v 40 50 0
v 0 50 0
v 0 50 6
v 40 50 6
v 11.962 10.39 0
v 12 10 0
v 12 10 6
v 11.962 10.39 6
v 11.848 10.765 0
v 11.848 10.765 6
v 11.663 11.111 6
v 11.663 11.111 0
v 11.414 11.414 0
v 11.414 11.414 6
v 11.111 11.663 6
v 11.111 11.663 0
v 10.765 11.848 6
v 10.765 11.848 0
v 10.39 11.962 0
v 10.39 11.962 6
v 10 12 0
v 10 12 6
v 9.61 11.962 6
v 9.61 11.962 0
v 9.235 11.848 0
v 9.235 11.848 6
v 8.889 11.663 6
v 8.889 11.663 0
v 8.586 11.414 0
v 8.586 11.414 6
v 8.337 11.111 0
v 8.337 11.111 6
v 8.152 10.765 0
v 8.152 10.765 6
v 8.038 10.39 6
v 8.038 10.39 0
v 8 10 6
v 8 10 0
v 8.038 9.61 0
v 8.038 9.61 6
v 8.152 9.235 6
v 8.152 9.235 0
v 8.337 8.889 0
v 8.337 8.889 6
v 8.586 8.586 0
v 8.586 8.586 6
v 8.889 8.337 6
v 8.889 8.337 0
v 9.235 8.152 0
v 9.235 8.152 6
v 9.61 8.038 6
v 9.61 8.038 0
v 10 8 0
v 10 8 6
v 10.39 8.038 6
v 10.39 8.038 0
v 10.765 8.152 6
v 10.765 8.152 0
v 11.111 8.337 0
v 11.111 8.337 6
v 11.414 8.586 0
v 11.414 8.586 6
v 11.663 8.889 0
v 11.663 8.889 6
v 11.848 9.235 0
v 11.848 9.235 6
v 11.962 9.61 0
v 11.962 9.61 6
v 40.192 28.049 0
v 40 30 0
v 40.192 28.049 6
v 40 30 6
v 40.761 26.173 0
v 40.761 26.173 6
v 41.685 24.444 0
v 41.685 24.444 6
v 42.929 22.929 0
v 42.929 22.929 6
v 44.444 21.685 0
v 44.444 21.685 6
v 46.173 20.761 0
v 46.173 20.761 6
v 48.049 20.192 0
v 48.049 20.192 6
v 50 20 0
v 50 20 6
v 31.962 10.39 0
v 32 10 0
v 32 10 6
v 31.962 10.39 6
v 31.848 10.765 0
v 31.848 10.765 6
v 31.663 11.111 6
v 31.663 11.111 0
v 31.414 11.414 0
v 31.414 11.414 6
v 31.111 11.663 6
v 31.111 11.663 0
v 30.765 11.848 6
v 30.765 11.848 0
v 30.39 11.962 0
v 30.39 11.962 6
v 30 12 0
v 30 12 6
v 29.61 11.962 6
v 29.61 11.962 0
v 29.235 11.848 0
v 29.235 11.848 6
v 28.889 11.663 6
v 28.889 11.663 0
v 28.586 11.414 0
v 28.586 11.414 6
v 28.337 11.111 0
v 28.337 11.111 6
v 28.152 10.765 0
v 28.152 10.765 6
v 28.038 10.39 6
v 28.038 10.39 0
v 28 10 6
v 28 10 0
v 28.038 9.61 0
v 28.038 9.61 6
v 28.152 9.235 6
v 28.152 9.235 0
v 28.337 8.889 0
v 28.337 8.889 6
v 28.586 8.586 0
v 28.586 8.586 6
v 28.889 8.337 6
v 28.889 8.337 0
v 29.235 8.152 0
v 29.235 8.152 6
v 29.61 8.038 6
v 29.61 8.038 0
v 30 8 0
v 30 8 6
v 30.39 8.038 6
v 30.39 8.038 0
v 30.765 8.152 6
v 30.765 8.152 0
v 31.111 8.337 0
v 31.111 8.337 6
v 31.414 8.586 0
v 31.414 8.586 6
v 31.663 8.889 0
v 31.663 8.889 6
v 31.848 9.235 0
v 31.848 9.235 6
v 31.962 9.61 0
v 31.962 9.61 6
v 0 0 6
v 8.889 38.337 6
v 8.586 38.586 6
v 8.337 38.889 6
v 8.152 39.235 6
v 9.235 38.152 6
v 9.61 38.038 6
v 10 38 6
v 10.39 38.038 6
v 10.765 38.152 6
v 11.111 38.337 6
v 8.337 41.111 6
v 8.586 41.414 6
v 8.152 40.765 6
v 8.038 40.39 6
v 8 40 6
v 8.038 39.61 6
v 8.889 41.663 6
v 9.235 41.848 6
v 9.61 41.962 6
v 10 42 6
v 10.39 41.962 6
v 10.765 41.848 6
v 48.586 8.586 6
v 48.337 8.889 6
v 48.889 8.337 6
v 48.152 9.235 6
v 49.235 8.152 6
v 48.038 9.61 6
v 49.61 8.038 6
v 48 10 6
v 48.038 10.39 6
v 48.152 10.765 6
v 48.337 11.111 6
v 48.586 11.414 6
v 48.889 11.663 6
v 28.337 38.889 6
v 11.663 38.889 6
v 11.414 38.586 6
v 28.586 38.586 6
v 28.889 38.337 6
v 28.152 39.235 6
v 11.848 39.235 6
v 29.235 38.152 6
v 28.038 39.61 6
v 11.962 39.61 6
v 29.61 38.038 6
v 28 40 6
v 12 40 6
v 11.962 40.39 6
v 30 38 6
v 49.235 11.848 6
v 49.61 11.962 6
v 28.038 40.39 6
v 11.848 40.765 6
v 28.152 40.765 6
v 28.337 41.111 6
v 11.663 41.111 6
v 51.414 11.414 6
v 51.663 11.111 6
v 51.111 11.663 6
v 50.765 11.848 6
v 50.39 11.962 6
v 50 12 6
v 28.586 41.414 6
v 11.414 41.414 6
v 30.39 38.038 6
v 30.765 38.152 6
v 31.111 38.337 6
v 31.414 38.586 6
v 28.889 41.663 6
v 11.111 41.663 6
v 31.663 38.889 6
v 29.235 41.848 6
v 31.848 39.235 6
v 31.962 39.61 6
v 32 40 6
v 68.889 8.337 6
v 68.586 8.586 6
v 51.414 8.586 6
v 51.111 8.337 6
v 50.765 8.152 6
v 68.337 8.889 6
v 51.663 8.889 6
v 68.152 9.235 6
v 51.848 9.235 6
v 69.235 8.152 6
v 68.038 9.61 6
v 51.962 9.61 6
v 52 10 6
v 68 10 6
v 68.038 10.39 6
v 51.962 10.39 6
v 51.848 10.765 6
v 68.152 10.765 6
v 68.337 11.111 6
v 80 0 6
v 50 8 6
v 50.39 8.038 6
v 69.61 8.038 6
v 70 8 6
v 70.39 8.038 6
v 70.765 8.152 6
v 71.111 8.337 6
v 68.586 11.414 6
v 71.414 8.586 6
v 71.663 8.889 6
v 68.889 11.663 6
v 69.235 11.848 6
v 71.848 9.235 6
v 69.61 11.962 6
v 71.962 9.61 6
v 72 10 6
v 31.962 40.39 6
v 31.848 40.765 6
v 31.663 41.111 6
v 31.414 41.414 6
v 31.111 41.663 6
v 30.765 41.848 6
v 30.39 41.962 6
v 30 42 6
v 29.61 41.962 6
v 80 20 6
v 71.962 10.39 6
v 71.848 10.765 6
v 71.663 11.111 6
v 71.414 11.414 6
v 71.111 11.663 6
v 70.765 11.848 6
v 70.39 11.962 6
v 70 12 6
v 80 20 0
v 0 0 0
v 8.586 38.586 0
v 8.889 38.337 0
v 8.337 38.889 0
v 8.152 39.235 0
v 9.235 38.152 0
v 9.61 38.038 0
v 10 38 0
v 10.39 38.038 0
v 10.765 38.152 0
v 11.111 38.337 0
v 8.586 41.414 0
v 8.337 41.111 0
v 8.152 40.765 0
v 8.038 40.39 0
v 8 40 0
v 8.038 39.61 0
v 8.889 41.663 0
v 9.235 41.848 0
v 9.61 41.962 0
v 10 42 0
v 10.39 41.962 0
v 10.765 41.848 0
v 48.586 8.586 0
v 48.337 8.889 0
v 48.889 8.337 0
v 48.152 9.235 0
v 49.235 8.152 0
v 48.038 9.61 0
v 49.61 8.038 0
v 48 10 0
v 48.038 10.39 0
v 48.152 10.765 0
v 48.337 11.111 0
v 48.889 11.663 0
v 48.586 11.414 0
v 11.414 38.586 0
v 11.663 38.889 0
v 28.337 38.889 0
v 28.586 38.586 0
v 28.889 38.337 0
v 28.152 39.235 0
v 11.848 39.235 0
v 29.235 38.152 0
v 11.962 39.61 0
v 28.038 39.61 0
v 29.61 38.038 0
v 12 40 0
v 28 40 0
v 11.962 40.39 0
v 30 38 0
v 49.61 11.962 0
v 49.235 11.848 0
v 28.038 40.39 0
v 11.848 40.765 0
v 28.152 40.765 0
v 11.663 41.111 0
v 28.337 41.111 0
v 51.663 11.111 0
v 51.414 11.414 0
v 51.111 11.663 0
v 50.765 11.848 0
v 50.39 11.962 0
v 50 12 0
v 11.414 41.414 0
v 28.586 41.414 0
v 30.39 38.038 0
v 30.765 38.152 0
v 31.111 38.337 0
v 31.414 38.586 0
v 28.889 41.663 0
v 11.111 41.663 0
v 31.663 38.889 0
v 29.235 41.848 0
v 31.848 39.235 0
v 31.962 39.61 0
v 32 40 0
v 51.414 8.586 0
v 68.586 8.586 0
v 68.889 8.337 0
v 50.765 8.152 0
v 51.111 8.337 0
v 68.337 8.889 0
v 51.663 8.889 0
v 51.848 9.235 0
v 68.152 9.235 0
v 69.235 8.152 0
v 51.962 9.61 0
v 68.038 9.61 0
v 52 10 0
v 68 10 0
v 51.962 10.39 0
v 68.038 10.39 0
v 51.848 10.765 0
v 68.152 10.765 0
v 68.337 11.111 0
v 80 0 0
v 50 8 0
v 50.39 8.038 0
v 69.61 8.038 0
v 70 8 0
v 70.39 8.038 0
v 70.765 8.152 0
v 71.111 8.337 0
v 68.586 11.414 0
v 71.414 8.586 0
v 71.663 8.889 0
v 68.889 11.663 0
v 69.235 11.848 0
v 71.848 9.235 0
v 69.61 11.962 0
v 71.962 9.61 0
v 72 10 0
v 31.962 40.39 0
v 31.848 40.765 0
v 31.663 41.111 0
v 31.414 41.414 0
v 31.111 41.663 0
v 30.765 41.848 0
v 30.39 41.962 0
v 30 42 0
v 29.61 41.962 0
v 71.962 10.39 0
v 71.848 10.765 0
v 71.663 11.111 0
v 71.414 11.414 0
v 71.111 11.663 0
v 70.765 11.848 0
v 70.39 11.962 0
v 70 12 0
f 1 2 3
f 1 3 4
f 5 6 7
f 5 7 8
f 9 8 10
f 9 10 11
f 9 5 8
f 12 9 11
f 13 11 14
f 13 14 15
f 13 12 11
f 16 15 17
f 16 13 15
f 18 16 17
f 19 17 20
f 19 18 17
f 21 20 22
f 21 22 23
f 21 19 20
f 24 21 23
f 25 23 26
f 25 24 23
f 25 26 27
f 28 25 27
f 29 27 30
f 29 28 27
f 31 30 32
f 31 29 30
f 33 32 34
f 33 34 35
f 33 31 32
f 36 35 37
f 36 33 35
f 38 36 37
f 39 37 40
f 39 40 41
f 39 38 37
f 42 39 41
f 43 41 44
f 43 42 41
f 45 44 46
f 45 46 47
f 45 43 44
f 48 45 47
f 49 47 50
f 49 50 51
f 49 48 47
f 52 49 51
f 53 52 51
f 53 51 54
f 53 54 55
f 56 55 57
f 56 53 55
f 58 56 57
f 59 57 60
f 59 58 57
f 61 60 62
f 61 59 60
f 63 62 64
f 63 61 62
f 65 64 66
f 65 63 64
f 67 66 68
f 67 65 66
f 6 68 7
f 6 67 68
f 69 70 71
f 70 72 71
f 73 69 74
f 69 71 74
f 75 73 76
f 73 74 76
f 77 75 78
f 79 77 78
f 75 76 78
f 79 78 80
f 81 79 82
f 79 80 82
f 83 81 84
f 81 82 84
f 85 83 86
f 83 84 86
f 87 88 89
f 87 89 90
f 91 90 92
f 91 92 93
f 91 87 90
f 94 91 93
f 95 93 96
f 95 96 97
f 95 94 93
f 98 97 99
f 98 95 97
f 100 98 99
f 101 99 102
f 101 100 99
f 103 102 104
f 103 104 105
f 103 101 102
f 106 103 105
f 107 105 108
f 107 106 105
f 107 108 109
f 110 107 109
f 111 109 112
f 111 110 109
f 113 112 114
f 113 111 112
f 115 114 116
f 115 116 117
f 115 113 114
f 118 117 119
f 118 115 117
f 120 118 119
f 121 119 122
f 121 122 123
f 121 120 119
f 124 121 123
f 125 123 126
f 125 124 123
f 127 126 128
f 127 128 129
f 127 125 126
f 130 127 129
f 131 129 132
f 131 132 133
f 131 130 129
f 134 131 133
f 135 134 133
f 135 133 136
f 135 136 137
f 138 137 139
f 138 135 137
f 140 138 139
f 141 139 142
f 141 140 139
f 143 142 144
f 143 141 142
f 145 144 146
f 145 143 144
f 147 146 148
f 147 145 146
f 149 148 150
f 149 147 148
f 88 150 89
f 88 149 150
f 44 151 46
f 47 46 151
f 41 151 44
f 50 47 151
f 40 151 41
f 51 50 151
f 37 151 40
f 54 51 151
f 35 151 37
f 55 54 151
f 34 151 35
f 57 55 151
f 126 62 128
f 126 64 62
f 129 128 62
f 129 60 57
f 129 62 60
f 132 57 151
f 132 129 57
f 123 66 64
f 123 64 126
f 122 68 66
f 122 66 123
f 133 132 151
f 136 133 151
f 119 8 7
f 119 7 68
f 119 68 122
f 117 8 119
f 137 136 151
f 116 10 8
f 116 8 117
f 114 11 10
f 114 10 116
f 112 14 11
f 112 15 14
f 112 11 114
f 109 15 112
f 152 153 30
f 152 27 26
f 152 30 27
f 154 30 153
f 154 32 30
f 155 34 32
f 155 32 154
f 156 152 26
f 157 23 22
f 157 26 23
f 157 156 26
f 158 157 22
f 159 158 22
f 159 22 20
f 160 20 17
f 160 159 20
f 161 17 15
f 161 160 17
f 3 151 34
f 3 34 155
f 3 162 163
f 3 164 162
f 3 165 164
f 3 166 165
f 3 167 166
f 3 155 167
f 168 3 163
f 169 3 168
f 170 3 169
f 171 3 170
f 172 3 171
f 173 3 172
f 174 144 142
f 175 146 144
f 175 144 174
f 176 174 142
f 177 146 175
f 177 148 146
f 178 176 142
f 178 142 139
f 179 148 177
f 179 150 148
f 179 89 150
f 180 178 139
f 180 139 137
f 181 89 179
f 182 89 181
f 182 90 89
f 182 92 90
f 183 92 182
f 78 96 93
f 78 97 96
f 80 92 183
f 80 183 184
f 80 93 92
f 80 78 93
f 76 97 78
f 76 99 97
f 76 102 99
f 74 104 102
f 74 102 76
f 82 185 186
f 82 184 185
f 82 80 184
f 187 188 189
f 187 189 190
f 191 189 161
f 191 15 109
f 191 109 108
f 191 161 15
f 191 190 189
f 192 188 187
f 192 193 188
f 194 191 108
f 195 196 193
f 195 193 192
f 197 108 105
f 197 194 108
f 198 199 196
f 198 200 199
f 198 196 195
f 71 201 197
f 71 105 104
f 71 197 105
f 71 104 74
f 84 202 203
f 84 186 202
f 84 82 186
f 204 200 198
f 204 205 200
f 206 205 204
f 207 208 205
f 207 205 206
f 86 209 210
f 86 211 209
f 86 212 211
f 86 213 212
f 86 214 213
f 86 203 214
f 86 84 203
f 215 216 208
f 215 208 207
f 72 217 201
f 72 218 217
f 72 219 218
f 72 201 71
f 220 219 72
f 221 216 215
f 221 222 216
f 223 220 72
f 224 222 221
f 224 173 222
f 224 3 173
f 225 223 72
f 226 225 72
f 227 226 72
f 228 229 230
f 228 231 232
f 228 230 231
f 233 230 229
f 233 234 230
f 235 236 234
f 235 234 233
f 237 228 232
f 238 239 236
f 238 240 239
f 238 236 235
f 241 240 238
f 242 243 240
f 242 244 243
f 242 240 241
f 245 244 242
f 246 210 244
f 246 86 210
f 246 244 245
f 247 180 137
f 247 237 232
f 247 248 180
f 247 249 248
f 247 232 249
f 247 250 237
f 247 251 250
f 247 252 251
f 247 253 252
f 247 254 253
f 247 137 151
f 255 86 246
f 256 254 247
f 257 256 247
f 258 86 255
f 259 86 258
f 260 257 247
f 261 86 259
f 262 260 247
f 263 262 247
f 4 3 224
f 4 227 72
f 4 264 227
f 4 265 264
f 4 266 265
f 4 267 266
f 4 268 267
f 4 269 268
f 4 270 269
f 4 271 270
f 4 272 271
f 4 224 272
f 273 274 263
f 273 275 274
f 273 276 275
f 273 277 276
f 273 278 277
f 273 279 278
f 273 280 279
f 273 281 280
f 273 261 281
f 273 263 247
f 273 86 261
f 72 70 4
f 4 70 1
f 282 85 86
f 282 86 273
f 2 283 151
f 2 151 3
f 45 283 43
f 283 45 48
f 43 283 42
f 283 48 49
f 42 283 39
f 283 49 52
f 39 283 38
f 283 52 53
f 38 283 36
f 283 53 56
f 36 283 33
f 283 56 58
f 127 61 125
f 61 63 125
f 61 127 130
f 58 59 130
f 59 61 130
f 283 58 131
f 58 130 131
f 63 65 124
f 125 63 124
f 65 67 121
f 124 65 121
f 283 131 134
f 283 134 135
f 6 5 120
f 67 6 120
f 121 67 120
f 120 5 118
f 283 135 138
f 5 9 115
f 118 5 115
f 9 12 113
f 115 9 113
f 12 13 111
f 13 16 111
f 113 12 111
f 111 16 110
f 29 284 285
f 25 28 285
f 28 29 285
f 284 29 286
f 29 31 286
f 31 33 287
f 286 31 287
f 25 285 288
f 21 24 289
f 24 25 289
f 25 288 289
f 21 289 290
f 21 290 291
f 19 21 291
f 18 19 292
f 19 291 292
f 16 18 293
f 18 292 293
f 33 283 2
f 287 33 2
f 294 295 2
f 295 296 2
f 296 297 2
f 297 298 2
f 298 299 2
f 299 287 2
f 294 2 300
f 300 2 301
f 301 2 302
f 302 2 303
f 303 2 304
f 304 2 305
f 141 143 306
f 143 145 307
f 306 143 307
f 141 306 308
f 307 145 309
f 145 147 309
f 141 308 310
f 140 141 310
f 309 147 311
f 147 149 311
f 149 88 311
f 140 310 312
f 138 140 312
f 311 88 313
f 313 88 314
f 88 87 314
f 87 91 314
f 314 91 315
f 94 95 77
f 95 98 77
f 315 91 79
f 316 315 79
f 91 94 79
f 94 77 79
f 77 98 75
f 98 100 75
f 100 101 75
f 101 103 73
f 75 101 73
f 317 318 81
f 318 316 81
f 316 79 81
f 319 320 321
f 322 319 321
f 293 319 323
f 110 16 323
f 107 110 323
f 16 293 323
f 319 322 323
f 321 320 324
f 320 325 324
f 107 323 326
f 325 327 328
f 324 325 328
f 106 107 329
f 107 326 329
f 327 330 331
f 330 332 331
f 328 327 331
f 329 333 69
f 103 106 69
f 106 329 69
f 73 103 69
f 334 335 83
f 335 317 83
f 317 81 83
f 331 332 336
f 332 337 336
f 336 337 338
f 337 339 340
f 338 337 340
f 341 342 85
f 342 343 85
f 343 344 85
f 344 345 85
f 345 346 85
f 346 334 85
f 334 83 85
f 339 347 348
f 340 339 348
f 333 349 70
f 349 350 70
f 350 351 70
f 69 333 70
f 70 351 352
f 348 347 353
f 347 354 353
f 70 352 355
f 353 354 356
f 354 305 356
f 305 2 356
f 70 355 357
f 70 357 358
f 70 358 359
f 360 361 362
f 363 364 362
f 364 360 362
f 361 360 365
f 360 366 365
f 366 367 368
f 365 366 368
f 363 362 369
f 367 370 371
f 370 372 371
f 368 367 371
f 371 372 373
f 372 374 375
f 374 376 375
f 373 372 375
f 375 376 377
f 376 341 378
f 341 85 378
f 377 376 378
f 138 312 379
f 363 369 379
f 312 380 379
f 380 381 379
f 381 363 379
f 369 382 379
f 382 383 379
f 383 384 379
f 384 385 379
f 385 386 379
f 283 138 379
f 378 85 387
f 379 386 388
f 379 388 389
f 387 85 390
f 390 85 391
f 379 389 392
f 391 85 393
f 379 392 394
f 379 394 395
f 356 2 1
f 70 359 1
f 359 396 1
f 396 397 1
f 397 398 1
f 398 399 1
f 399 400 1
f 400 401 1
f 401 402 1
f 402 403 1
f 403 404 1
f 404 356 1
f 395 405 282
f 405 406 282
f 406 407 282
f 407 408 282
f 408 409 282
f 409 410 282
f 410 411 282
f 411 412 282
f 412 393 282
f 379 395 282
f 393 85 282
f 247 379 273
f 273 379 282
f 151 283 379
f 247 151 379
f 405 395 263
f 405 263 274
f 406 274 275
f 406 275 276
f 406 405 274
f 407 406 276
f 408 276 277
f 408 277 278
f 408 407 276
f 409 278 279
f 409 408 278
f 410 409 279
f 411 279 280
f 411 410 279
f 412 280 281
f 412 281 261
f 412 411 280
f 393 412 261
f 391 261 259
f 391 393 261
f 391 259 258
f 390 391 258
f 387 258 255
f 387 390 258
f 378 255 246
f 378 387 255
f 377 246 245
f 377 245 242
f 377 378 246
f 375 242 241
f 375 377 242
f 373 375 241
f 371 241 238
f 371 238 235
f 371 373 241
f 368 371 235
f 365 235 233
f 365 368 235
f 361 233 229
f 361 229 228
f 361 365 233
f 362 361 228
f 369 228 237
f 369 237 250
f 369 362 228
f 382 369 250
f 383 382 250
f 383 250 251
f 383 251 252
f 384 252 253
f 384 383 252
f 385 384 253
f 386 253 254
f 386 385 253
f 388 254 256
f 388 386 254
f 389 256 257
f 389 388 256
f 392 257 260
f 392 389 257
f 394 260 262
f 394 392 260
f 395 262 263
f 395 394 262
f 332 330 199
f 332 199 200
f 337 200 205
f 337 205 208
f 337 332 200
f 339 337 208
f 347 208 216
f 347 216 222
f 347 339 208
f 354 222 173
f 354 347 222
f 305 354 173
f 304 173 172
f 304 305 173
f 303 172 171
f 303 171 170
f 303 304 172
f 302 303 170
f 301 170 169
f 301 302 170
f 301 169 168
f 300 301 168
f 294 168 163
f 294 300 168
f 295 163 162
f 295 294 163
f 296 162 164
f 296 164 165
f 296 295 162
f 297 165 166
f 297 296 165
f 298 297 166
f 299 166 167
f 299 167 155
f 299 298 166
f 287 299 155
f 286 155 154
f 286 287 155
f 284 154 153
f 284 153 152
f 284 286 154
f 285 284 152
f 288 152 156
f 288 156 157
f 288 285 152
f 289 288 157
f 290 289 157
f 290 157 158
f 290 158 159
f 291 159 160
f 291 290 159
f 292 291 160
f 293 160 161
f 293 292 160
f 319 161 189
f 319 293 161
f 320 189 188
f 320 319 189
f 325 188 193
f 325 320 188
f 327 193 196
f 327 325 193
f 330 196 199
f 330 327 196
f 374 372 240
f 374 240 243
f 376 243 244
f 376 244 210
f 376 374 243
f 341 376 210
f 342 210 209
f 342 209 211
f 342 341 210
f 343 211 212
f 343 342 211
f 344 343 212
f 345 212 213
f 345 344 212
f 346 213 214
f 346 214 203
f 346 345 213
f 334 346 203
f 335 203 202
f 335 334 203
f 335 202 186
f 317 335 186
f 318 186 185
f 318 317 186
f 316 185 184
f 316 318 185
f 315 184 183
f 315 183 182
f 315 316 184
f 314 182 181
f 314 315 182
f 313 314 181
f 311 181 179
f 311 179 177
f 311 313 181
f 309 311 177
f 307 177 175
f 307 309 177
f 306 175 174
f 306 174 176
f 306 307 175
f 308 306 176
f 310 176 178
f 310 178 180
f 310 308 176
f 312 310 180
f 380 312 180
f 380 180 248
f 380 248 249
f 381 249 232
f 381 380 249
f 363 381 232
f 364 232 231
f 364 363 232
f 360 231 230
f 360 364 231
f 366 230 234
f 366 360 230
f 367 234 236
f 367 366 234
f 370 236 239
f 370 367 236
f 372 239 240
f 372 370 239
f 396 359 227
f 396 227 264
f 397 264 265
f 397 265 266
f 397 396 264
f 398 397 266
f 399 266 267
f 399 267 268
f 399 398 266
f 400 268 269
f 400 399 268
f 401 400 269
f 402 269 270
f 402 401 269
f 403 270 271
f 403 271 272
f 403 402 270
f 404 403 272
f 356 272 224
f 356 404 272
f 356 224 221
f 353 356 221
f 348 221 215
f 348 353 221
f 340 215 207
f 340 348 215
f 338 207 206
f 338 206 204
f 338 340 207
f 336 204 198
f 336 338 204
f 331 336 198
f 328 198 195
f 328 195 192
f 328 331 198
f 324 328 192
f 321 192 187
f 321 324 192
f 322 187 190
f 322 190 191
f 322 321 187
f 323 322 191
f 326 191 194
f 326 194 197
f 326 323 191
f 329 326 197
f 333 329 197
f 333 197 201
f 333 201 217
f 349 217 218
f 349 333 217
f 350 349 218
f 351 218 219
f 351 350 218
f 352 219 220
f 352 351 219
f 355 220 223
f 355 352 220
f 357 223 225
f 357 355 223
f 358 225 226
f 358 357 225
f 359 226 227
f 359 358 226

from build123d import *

# Parameters (mm, degrees)
ESBO_O1_W                = 40
ESBO_O1_H                = 50
ESBO_O1_R                = 2
ESBO_O1_H_2              = 20
RESSALTO_EXTRUS_O1_DEPTH = 6
FILETE1_R                = 10


with BuildPart() as part:
    # Esboço1 → Ressalto-extrusão1 (new body)
    # profile 1 of 2: a face of its own
    with BuildSketch(Plane.XY):
        with Locations((20, 25)):
            Rectangle(ESBO_O1_W, ESBO_O1_H)
        with Locations((30, 10)):
            Circle(ESBO_O1_R, mode=Mode.SUBTRACT)
        with Locations((10, 10)):
            Circle(ESBO_O1_R, mode=Mode.SUBTRACT)
        with Locations((30, 40)):
            Circle(ESBO_O1_R, mode=Mode.SUBTRACT)
        with Locations((10, 40)):
            Circle(ESBO_O1_R, mode=Mode.SUBTRACT)
    # profile 2 of 2: a face of its own
    with BuildSketch(Plane.XY):
        with Locations((60, 10)):
            Rectangle(ESBO_O1_W, ESBO_O1_H_2)
        with Locations((50, 10)):
            Circle(ESBO_O1_R, mode=Mode.SUBTRACT)
        with Locations((70, 10)):
            Circle(ESBO_O1_R, mode=Mode.SUBTRACT)
    extrude(amount=RESSALTO_EXTRUS_O1_DEPTH)

    # Filete1
    filete1_edges = [part.edges().sort_by_distance(p)[0] for p in [
        (40, 20, 3),
    ]]
    fillet(filete1_edges, radius=FILETE1_R)


solid = part.part
